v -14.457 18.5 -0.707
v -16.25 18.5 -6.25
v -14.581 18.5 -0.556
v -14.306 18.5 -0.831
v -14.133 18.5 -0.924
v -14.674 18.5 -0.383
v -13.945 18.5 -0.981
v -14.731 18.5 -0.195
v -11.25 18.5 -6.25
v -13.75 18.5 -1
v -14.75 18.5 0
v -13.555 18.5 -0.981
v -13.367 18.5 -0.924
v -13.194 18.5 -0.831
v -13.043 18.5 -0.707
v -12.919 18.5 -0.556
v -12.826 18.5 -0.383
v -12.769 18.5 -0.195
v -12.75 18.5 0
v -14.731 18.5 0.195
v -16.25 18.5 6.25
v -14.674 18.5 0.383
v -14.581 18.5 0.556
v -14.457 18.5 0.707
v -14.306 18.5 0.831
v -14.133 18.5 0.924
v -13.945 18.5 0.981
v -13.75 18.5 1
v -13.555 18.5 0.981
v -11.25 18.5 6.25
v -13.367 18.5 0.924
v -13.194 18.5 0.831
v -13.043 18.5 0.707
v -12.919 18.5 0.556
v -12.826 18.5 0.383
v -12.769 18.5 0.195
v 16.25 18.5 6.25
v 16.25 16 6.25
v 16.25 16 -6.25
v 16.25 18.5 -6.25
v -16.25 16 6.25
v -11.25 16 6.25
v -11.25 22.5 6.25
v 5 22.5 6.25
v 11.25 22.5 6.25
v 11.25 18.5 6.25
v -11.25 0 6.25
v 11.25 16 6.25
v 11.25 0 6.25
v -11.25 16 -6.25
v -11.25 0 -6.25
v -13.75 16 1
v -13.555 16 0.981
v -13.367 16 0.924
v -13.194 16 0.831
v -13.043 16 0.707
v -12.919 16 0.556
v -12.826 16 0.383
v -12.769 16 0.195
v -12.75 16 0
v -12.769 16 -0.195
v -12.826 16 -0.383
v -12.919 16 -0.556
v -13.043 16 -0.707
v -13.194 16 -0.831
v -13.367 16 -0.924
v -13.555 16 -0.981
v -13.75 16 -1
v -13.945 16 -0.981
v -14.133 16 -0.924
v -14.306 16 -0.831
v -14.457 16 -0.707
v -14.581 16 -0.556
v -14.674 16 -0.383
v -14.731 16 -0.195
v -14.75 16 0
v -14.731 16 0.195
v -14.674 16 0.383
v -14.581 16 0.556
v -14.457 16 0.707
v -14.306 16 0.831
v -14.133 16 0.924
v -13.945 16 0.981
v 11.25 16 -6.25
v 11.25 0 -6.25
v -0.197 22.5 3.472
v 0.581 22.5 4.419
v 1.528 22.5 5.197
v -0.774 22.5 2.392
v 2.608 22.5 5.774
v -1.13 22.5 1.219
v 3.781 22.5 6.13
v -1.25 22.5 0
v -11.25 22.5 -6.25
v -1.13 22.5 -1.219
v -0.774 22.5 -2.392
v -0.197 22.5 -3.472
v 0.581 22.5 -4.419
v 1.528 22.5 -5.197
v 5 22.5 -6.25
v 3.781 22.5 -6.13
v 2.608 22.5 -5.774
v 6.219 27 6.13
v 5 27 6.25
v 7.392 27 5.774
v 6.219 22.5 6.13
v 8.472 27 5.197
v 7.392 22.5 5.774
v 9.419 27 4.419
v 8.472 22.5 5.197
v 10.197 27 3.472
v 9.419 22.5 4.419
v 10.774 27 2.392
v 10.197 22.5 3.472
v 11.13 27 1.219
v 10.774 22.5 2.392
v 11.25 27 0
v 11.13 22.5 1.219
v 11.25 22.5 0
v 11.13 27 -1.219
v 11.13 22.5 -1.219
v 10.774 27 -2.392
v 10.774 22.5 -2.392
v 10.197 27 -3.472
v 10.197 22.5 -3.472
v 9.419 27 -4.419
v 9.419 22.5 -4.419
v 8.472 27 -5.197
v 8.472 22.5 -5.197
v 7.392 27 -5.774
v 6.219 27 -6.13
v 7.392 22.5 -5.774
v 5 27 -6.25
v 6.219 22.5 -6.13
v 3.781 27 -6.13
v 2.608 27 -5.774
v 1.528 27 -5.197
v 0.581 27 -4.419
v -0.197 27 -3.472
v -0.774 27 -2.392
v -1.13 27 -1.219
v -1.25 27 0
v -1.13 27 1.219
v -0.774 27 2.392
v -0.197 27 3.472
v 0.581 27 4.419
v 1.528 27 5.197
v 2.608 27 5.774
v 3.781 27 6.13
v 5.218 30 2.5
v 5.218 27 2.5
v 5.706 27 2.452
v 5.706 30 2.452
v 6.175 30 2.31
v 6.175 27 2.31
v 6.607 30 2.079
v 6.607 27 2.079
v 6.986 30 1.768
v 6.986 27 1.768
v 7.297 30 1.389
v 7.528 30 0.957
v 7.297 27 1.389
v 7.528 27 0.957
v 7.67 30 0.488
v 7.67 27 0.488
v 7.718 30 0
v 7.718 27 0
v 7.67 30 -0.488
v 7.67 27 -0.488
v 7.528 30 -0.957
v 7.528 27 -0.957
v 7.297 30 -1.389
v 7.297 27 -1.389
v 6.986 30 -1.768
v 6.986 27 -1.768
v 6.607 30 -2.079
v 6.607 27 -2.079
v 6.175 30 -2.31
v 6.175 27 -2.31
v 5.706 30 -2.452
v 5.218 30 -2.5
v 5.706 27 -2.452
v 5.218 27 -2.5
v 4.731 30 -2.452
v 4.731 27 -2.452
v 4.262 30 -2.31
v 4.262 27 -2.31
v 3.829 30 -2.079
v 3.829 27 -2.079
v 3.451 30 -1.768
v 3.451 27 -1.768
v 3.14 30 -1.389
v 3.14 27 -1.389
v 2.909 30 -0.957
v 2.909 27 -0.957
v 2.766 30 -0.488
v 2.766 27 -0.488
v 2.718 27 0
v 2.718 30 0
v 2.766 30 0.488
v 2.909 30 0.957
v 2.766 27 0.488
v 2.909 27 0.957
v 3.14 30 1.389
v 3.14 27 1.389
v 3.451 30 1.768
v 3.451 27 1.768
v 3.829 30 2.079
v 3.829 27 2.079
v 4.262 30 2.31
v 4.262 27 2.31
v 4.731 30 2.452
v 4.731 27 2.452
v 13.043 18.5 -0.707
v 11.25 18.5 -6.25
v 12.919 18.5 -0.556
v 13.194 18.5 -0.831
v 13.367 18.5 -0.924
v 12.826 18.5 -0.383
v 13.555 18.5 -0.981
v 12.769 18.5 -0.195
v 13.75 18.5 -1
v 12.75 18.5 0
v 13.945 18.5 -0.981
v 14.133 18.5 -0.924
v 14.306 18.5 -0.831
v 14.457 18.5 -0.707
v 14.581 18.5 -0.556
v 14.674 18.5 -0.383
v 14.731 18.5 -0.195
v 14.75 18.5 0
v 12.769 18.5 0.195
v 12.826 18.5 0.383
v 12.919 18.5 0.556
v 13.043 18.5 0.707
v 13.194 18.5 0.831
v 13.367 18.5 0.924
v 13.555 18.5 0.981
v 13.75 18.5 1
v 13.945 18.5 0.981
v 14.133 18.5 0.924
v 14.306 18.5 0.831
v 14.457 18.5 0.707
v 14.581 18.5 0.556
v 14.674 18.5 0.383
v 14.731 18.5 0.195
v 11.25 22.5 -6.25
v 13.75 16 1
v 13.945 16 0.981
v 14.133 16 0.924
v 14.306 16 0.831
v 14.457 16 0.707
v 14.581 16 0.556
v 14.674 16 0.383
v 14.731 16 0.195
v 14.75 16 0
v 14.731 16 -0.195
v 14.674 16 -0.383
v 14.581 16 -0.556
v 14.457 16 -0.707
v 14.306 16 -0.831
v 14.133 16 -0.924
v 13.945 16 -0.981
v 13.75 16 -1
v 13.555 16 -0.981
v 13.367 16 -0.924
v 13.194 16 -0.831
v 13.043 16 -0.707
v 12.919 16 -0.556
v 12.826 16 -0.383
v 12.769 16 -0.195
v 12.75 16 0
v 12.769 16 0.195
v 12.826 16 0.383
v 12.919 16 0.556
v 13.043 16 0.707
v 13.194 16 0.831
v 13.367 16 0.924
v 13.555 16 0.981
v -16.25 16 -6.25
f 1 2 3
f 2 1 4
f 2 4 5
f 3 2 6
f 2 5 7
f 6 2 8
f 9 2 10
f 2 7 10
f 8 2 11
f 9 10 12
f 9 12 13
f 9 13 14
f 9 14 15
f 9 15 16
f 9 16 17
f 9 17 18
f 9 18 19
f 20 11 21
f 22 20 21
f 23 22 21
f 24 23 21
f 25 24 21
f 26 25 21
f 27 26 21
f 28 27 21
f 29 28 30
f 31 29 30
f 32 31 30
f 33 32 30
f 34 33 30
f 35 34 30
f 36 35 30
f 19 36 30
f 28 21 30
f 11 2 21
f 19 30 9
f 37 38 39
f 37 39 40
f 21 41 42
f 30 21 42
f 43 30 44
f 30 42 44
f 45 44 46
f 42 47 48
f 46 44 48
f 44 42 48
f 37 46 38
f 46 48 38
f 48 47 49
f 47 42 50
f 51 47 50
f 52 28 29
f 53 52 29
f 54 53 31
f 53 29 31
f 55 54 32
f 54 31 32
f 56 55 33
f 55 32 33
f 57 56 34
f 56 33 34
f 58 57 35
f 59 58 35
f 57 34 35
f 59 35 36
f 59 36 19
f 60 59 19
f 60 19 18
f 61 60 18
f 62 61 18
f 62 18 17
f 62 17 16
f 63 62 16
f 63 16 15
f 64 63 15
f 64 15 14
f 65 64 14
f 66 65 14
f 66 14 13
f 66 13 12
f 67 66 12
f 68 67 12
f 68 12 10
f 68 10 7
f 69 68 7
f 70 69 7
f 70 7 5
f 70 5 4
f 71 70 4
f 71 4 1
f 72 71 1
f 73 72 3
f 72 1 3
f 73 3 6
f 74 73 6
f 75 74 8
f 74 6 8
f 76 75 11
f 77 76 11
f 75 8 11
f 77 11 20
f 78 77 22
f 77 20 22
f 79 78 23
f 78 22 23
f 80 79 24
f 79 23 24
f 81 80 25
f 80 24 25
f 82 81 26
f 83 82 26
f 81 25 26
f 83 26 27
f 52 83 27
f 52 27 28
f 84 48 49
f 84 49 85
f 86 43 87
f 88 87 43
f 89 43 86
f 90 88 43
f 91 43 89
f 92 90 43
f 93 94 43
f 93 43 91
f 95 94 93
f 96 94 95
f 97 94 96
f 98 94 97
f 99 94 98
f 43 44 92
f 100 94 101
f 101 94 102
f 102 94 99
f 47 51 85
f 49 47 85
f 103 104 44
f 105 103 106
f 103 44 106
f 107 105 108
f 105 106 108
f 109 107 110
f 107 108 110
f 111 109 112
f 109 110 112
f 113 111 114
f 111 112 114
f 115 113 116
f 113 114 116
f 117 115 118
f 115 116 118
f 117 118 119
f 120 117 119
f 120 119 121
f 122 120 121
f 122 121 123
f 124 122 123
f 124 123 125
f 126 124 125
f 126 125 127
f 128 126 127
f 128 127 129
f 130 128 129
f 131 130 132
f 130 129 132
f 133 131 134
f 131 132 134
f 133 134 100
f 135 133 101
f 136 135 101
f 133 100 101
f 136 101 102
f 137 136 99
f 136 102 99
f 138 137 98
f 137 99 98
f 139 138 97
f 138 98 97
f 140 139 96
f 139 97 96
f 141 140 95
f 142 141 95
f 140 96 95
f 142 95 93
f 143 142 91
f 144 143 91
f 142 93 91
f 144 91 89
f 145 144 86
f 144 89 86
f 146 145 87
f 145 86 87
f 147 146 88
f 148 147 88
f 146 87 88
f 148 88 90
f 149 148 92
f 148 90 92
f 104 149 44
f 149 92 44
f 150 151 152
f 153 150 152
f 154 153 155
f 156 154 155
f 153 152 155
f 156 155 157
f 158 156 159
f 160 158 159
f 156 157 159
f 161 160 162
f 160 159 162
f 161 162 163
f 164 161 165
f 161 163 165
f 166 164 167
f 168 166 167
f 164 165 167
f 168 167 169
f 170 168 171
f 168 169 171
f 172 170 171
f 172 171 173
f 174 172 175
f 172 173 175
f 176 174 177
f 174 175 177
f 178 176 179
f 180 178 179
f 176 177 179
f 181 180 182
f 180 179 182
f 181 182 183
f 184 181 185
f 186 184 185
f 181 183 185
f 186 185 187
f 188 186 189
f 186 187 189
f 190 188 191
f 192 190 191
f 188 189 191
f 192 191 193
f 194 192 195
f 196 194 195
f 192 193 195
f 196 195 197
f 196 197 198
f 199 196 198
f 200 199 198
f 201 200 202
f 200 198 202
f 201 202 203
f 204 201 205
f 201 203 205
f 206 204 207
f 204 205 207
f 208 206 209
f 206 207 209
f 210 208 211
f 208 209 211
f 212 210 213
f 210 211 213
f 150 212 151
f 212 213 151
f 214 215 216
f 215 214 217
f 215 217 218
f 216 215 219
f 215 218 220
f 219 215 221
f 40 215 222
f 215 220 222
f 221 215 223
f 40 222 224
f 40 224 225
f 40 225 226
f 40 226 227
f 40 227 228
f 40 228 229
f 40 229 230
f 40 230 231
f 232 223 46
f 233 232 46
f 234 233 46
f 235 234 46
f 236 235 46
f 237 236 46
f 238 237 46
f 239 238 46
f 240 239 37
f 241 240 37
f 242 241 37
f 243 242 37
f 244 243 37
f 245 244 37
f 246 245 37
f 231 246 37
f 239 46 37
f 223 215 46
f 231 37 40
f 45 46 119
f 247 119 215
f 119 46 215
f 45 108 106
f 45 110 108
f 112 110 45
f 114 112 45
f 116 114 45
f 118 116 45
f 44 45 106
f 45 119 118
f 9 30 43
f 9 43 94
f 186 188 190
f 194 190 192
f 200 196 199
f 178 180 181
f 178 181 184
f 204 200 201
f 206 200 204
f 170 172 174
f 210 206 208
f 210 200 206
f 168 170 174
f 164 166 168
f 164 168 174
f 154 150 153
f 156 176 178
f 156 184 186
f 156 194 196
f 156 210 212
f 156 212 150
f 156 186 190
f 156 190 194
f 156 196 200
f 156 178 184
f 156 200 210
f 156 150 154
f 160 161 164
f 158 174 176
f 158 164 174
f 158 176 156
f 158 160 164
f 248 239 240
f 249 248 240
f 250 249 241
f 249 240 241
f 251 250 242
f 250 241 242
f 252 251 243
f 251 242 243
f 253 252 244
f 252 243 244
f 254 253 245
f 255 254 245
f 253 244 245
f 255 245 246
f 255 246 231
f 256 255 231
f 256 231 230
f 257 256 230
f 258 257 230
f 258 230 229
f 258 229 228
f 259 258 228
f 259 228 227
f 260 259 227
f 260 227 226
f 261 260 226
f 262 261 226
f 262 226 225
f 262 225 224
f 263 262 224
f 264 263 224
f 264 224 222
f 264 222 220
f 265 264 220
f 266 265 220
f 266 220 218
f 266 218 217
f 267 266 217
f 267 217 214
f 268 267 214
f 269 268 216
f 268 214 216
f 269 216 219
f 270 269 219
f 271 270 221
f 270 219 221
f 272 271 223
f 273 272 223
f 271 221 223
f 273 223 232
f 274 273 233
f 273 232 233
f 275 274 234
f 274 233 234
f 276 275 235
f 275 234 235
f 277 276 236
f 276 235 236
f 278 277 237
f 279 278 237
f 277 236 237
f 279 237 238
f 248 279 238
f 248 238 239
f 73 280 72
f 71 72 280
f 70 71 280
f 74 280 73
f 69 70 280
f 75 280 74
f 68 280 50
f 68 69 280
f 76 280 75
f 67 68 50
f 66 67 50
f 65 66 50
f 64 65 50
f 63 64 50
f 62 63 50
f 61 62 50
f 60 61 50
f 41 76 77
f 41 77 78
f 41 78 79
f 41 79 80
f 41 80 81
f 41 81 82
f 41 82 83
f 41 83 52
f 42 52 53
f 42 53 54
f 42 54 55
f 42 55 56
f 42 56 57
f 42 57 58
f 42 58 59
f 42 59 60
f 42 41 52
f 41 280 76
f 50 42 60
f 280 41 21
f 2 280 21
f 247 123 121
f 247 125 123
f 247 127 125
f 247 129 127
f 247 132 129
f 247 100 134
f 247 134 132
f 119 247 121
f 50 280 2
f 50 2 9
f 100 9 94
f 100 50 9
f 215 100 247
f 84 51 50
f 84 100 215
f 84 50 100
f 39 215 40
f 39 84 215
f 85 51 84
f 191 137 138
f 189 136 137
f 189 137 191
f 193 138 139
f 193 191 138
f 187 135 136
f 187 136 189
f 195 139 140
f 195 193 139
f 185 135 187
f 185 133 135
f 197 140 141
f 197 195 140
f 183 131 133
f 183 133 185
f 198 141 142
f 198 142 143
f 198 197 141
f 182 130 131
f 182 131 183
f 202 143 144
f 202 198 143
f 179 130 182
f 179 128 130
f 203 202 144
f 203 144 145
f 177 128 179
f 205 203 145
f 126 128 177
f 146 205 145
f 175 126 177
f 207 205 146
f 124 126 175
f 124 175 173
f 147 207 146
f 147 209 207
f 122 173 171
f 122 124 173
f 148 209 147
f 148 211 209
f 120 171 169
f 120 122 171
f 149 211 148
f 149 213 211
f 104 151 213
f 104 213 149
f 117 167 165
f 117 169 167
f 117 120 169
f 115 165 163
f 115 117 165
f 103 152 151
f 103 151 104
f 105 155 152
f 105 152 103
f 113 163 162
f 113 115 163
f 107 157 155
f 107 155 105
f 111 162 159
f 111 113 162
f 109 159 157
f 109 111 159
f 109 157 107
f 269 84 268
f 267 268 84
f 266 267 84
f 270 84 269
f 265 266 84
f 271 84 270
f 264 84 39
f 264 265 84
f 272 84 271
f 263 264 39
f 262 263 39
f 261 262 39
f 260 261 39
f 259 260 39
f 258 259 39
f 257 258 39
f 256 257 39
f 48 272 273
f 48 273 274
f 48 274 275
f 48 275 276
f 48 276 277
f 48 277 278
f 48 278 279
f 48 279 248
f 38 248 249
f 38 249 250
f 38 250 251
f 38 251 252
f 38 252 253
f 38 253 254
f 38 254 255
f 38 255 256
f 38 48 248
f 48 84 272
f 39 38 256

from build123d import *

# Parameters (mm, degrees)
CROQUIS1_W              = 22.5
CROQUIS1_H              = 12.5
SALIENTE_EXTRUIR1_DEPTH = 22.5
CROQUIS2_W              = 5
CROQUIS2_H              = 2.5
SALIENTE_EXTRUIR2_DEPTH = 12.5
CORTAR_EXTRUIR1_REACH   = 27.404
CROQUIS3_R              = 1
CROQUIS4_R              = 6.25
SALIENTE_EXTRUIR3_DEPTH = 4.5
CROQUIS5_R              = 2.5
SALIENTE_EXTRUIR4_DEPTH = 3


with BuildPart() as part:
    # Croquis1 → Saliente-Extruir1 (new body)
    with BuildSketch(Plane(origin=(0, 0, 0), x_dir=(1, 0, 0), z_dir=(0, 1, 0))):
        Rectangle(CROQUIS1_W, CROQUIS1_H)
    extrude(amount=SALIENTE_EXTRUIR1_DEPTH)

    # Croquis2 → Saliente-Extruir2 (add)
    with BuildSketch(Plane.XY.offset(6.25)):
        with Locations((13.75, 17.25)):
            Rectangle(CROQUIS2_W, CROQUIS2_H)
        with Locations((-13.75, 17.25)):
            Rectangle(CROQUIS2_W, CROQUIS2_H)
    extrude(amount=-SALIENTE_EXTRUIR2_DEPTH)

    # Croquis3 → Cortar-Extruir1 (cut, up to next)
    with BuildSketch(Plane(origin=(0, 18.5, 0), x_dir=(1, 0, 0), z_dir=(0, 1, 0)), mode=Mode.PRIVATE) as cortar_extruir1_sk1:
        with Locations(Location((13.75, 0, 0), (0, 0, 270))):
            Circle(CROQUIS3_R)
    cortar_extruir1_tool1 = extrude(cortar_extruir1_sk1.sketch, amount=-CORTAR_EXTRUIR1_REACH, mode=Mode.PRIVATE) & part.part
    # Croquis3 → Cortar-Extruir1 (cut, up to next)
    with BuildSketch(Plane(origin=(0, 18.5, 0), x_dir=(1, 0, 0), z_dir=(0, 1, 0)), mode=Mode.PRIVATE) as cortar_extruir1_sk2:
        with Locations(Location((-13.75, 0, 0), (0, 0, 270))):
            Circle(CROQUIS3_R)
    cortar_extruir1_tool2 = extrude(cortar_extruir1_sk2.sketch, amount=-CORTAR_EXTRUIR1_REACH, mode=Mode.PRIVATE) & part.part
    add(cortar_extruir1_tool1.solids().sort_by_distance((13.75, 18.5, 0))[0], mode=Mode.SUBTRACT)
    add(cortar_extruir1_tool2.solids().sort_by_distance((-13.75, 18.5, 0))[0], mode=Mode.SUBTRACT)

    # Croquis4 → Saliente-Extruir3 (add)
    with BuildSketch(Plane(origin=(0, 22.5, 0), x_dir=(1, 0, 0), z_dir=(0, 1, 0))):
        with Locations(Location((5, 0, 0), (0, 0, 270))):
            Circle(CROQUIS4_R)
    extrude(amount=SALIENTE_EXTRUIR3_DEPTH)

    # Croquis5 → Saliente-Extruir4 (add)
    with BuildSketch(Plane(origin=(0, 27, 0), x_dir=(1, 0, 0), z_dir=(0, 1, 0))):
        with Locations(Location((5.218378147, 0, 0), (0, 0, 270))):
            Circle(CROQUIS5_R)
    extrude(amount=SALIENTE_EXTRUIR4_DEPTH)


solid = part.part
